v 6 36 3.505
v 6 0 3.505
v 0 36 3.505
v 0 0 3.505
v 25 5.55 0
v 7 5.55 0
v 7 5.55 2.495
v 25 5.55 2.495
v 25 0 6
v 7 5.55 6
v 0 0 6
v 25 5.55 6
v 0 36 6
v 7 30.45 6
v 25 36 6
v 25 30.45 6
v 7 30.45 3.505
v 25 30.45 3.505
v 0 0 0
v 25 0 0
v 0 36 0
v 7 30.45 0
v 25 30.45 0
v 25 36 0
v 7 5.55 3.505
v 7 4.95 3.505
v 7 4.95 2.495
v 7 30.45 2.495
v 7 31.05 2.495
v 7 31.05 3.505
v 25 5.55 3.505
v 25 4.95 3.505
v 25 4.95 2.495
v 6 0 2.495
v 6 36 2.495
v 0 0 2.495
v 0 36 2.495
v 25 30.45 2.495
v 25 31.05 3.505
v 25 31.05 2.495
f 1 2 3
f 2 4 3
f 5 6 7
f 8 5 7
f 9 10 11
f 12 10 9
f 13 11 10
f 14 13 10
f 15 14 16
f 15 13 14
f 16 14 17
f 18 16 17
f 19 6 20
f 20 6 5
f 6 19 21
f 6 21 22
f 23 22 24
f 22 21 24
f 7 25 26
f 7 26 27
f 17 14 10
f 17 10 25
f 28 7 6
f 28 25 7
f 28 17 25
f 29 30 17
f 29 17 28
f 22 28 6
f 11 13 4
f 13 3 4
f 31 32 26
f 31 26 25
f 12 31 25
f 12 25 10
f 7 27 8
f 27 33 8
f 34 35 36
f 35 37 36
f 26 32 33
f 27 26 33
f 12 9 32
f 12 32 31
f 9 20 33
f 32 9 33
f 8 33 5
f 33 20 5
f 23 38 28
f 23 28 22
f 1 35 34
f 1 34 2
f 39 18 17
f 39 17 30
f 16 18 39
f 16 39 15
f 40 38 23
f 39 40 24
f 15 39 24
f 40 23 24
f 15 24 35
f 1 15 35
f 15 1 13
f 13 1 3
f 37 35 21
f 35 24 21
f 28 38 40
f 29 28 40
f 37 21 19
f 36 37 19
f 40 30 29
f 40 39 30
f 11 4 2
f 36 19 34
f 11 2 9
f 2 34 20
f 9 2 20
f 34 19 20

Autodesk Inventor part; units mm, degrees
sketch "Sketch1" plane through (0, 0, 0) normal (0, 0, 1) x (1, 0, 0)
  line L0 (0, 0) -> (25, 0)
  line L1 (25, 0) -> (25, 36)
  line L2 (25, 36) -> (0, 36)
  line L3 (0, 36) -> (0, 0)
  dimension "d0" = 25
  dimension "d1" = 36
extrude "Extrusion1" add sketch "Sketch1" along normal blind 6
sketch "Sketch2" plane through (0, 0, 0) normal (-1, 0, 0) x (0, 0, 1)
  line L0 (0, 0) -> (6, 0) projected
  line L1 (0, 36) -> (6, 36) projected
  line L2 (2.495, 0) -> (3.505, 0)
  line L3 (3.505, 0) -> (3.505, 36)
  line L4 (3.505, 36) -> (2.495, 36)
  line L5 (2.495, 36) -> (2.495, 0)
  point P0 (3, 0)
  point P1 (3, 0)
  dimension "d4" = 0
  dimension "d5" = 1.01
extrude "Extrusion2" cut sketch "Sketch2" against normal blind 6
sketch "Sketch3" plane through (25, 0, 0) normal (1, 0, 0) x (0, 0, -1)
  line L0 (0, 36) -> (-6, 36) projected
  line L1 (-3.505, 4.95) -> (-2.495, 4.95)
  line L2 (-2.495, 4.95) -> (-2.495, 31.05)
  line L3 (0, 0) -> (-6, 0) projected
  line L4 (0, 0) -> (0, 36) projected
  line L5 (-3.505, 4.95) -> (-3.505, 31.05)
  line L6 (-3.505, 31.05) -> (-2.495, 31.05)
  point P0 (-3.505, 0)
  point P1 (-2.495, 0)
  point P2 (-3, 4.95)
  point P3 (-3, 0)
  point P4 (0, 18)
  point P5 (-2.495, 18)
  dimension "d11" = 26.1
  dimension "d13" = 0
  dimension "d14" = 0
  dimension "d15" = 1.01
extrude "Extrusion3" cut sketch "Sketch3" against normal blind 18
sketch "Sketch4" plane through (25, 0, 0) normal (1, 0, 0) x (0, 0, -1)
  line L0 (0, 36) -> (0, 0) projected
  line L1 (-6, 36) -> (-6, 0) projected
  line L2 (0, 5.55) -> (-6, 5.55)
  line L3 (-6, 5.55) -> (-6, 30.45)
  line L4 (-6, 30.45) -> (0, 30.45)
  line L5 (0, 30.45) -> (0, 5.55)
  line L6 (-2.495, 4.95) -> (-3.505, 4.95) projected
  point P0 (0, 18)
  point P1 (0, 18)
  dimension "d16" = 0
  dimension "d19" = 0.6
extrude "Extrusion4" cut sketch "Sketch4" against normal blind 18
properties part number "camera_support_on_carbon_blade"
